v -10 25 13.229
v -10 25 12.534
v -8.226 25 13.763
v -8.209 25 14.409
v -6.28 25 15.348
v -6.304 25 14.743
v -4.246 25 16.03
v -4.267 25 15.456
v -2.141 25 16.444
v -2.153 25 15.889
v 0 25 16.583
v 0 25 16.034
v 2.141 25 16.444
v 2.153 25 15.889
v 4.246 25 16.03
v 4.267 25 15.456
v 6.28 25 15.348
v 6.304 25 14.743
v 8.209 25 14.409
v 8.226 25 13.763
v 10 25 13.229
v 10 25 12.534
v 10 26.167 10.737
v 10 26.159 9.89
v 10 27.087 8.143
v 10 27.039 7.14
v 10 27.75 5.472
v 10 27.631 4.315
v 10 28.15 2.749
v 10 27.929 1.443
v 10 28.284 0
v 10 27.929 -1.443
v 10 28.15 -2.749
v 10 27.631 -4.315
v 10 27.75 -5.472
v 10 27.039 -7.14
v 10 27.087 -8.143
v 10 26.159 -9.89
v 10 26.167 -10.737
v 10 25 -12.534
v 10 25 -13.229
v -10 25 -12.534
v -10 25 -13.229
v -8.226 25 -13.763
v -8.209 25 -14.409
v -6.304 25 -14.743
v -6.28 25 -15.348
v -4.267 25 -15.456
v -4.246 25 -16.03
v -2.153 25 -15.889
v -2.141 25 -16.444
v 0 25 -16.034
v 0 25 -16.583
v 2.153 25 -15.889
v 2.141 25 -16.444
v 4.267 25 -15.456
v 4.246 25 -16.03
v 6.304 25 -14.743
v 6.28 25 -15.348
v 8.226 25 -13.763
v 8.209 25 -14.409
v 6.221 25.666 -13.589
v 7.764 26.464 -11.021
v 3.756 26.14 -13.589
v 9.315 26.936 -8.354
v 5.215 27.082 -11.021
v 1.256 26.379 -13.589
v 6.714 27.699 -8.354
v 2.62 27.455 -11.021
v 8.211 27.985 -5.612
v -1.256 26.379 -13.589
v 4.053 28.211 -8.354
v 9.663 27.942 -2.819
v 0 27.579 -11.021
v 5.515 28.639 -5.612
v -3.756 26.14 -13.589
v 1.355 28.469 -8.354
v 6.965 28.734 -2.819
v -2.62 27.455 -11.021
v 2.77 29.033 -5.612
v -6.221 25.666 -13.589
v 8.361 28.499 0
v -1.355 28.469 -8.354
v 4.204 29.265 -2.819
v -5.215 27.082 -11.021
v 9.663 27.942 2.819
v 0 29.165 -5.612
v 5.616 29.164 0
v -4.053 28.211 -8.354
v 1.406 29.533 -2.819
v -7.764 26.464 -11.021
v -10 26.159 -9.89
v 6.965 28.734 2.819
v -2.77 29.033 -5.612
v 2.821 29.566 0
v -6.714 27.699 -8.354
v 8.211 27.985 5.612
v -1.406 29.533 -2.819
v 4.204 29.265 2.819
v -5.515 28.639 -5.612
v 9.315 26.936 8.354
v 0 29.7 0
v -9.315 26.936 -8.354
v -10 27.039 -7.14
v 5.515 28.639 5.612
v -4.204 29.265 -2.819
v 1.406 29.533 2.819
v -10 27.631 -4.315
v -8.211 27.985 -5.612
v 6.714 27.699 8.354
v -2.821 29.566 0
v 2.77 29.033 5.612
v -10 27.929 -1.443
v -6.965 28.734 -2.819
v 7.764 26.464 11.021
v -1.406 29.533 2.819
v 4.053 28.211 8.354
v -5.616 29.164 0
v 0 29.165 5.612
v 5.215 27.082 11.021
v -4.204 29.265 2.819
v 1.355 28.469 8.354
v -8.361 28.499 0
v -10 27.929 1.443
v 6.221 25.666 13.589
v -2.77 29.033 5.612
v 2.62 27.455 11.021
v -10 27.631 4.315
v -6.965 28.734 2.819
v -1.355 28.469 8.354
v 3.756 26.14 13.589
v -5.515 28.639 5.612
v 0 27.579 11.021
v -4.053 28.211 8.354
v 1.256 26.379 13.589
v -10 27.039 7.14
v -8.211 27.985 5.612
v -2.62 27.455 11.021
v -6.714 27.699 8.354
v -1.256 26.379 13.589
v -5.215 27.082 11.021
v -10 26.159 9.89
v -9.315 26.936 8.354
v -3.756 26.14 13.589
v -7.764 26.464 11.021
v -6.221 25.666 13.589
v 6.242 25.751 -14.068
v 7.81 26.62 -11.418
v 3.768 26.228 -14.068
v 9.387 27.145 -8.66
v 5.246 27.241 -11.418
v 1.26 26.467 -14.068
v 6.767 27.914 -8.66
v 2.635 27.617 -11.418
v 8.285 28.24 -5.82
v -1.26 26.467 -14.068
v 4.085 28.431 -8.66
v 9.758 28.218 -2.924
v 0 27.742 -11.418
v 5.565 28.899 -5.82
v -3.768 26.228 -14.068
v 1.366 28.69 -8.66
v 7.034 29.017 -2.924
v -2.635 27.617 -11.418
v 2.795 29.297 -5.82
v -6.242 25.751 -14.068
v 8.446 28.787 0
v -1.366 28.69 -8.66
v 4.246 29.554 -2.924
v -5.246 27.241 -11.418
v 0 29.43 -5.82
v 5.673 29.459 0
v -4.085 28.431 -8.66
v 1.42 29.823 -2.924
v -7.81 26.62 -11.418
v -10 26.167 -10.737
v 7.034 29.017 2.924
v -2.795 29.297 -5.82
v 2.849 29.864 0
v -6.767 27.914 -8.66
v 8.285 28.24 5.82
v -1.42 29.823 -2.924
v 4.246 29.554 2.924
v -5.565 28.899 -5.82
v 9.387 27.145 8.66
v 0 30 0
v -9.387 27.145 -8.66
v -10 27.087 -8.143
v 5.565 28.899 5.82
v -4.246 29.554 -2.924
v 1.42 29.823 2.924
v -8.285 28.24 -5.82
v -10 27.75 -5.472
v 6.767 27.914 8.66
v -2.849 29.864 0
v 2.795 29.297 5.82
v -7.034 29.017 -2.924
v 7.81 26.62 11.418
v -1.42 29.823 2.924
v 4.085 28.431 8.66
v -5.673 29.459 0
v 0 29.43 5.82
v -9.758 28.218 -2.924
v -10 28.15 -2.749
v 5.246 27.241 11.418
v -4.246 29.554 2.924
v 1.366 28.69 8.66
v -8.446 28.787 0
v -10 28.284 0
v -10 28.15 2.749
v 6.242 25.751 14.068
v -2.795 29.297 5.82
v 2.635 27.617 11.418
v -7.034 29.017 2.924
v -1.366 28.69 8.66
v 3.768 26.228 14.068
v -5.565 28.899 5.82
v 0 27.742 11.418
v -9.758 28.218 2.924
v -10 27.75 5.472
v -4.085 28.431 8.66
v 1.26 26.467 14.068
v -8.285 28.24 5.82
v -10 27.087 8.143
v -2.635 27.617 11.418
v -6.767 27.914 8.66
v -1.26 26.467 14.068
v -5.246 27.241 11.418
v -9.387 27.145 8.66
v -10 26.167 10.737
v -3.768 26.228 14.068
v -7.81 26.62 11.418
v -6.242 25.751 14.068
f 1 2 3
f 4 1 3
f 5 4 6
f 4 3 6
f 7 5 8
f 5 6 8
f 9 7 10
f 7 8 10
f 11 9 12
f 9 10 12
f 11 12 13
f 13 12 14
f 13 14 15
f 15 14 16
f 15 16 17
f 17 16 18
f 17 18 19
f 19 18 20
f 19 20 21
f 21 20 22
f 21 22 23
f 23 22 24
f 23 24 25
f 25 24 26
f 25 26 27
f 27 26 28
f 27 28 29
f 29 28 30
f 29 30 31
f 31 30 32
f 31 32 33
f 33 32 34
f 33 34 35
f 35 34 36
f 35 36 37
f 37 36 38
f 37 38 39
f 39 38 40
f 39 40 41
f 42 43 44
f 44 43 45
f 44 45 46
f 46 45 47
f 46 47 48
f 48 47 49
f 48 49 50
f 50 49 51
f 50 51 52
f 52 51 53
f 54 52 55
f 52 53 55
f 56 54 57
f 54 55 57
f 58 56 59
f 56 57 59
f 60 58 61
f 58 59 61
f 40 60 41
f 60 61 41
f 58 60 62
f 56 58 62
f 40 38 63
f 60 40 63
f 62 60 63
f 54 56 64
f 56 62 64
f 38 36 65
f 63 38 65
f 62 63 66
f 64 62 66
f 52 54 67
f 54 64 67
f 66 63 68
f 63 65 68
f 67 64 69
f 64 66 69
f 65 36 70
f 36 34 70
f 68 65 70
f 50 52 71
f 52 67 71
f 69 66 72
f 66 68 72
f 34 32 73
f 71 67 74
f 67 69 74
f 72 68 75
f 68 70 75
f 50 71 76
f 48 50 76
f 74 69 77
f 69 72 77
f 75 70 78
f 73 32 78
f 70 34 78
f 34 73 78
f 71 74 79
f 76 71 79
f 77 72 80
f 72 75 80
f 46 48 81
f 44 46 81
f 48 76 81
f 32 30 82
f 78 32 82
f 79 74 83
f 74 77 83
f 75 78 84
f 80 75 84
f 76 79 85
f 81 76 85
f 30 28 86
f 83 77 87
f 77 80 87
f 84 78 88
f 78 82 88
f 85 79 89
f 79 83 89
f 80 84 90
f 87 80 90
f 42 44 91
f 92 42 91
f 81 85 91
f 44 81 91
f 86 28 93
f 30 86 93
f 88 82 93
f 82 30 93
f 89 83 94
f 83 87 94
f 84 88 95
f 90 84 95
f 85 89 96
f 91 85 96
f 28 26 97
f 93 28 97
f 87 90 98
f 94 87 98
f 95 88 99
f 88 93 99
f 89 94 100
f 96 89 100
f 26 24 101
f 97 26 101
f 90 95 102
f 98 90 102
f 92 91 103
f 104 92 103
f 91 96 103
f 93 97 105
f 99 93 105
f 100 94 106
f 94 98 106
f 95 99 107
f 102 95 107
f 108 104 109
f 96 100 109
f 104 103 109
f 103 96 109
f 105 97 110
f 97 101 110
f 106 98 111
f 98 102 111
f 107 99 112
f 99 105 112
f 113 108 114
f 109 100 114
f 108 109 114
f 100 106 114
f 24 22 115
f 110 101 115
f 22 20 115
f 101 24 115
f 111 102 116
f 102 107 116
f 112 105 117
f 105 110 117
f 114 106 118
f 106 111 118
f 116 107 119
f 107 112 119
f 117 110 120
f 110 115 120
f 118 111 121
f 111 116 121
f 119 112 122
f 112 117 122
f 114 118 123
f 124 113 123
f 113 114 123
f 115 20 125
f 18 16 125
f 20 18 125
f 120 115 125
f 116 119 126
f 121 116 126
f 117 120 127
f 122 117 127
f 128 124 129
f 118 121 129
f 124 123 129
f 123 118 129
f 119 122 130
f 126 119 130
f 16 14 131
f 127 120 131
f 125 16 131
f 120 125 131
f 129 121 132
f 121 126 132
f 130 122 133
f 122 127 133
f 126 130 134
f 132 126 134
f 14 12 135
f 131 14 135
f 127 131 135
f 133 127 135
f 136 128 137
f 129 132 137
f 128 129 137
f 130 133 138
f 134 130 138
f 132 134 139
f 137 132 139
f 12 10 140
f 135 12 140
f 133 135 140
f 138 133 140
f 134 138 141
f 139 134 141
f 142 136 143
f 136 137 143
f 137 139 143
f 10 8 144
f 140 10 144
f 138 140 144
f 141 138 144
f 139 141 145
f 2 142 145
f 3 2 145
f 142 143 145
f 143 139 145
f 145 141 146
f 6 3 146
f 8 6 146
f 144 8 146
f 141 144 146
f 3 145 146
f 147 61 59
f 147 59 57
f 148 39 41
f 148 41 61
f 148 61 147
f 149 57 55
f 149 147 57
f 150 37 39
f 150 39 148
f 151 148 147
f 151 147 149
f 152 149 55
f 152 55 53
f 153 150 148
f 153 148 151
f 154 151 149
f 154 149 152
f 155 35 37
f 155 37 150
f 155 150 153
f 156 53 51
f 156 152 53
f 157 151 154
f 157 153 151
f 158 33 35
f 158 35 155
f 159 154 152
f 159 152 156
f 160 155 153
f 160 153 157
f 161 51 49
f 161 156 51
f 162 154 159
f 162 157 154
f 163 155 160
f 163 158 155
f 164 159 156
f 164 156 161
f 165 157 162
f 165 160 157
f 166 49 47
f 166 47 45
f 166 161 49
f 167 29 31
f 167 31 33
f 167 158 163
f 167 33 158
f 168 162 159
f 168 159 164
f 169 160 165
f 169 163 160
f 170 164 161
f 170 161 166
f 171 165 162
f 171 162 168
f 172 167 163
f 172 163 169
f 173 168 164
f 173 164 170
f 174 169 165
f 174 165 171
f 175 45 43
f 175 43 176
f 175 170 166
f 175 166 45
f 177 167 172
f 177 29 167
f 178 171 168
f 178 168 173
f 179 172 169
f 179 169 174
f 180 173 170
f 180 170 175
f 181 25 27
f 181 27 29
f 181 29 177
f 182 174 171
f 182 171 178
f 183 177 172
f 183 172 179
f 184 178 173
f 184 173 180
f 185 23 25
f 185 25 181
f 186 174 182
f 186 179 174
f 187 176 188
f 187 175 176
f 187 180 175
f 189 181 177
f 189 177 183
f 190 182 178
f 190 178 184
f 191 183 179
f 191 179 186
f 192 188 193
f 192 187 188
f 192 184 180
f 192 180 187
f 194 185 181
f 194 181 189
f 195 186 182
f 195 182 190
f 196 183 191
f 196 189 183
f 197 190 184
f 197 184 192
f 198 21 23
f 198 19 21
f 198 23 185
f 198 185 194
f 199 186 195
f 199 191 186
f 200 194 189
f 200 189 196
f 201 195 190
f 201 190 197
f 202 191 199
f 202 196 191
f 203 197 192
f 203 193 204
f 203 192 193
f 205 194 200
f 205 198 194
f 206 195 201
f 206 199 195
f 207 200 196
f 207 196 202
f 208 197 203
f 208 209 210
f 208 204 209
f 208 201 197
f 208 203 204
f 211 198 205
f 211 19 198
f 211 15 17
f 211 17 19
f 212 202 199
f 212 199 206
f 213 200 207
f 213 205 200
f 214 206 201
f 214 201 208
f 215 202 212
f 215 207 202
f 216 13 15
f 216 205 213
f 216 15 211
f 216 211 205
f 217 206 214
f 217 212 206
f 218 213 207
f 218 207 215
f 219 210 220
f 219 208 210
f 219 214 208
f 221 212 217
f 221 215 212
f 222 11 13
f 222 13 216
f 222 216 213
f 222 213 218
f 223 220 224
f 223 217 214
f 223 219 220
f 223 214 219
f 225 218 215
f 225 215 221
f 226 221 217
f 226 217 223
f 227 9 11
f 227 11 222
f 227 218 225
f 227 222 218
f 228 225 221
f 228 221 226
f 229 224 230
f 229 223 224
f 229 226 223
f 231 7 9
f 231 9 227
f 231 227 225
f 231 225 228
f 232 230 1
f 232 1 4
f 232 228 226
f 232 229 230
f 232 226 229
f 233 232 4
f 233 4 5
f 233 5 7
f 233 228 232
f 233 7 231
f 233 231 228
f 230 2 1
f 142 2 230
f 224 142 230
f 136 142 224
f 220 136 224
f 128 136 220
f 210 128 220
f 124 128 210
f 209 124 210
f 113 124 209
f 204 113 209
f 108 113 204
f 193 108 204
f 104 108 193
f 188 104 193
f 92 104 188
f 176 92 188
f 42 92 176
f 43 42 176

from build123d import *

# Parameters (mm, degrees)
BOX002_W        = 10
BOX002_H        = 10
BOX002_DEPTH    = 40
BOX001_W        = 10
BOX001_H        = 10
BOX001_DEPTH    = 40
BOX_W           = 60
BOX_H           = 40
BOX_DEPTH       = 60
SPHERE001_ANGLE = 180
SPHERE_ANGLE    = 180


with BuildPart() as cube002:
    # Box002 → Box002 (new body)
    with BuildSketch(Plane(origin=(-20, 20, -20), x_dir=(1, 0, 0), z_dir=(0, 0, 1))):
        with Locations((5, 5)):
            Rectangle(BOX002_W, BOX002_H)
    extrude(amount=BOX002_DEPTH)


with BuildPart() as cube001:
    # Box001 → Box001 (new body)
    with BuildSketch(Plane(origin=(10, 20, -20), x_dir=(1, 0, 0), z_dir=(0, 0, 1))):
        with Locations((5, 5)):
            Rectangle(BOX001_W, BOX001_H)
    extrude(amount=BOX001_DEPTH)


with BuildPart() as cube:
    # Box → Box (new body)
    with BuildSketch(Plane(origin=(-30, -15, -30), x_dir=(1, 0, 0), z_dir=(0, 0, 1))):
        with Locations((30, 20)):
            Rectangle(BOX_W, BOX_H)
    extrude(amount=BOX_DEPTH)


with BuildPart() as inner:
    # Sphere001 → Sphere001 (revolve)
    with BuildSketch(Plane.XZ):
        with BuildLine():
            ThreePointArc((0, -29.7), (29.7, 0), (0, 29.7))
            Line((0, 29.7), (0, -29.7))
        make_face()
    revolve(axis=Axis((0, 0, 0), (0, 0, 1)), revolution_arc=SPHERE001_ANGLE)


with BuildPart() as cutmirror:
    # Sphere → Sphere (revolve)
    with BuildSketch(Plane.XZ):
        with BuildLine():
            ThreePointArc((0, -30), (30, 0), (0, 30))
            Line((0, 30), (0, -30))
        make_face()
    revolve(axis=Axis((0, 0, 0), (0, 0, 1)), revolution_arc=SPHERE_ANGLE)

    # Cut: cut Inner
    add(inner.part, mode=Mode.SUBTRACT)

    # Cut001: cut Cube
    add(cube.part, mode=Mode.SUBTRACT)

    # Cut002: cut Cube001
    add(cube001.part, mode=Mode.SUBTRACT)

    # Cut003: cut Cube002
    add(cube002.part, mode=Mode.SUBTRACT)


solid = cutmirror.part
